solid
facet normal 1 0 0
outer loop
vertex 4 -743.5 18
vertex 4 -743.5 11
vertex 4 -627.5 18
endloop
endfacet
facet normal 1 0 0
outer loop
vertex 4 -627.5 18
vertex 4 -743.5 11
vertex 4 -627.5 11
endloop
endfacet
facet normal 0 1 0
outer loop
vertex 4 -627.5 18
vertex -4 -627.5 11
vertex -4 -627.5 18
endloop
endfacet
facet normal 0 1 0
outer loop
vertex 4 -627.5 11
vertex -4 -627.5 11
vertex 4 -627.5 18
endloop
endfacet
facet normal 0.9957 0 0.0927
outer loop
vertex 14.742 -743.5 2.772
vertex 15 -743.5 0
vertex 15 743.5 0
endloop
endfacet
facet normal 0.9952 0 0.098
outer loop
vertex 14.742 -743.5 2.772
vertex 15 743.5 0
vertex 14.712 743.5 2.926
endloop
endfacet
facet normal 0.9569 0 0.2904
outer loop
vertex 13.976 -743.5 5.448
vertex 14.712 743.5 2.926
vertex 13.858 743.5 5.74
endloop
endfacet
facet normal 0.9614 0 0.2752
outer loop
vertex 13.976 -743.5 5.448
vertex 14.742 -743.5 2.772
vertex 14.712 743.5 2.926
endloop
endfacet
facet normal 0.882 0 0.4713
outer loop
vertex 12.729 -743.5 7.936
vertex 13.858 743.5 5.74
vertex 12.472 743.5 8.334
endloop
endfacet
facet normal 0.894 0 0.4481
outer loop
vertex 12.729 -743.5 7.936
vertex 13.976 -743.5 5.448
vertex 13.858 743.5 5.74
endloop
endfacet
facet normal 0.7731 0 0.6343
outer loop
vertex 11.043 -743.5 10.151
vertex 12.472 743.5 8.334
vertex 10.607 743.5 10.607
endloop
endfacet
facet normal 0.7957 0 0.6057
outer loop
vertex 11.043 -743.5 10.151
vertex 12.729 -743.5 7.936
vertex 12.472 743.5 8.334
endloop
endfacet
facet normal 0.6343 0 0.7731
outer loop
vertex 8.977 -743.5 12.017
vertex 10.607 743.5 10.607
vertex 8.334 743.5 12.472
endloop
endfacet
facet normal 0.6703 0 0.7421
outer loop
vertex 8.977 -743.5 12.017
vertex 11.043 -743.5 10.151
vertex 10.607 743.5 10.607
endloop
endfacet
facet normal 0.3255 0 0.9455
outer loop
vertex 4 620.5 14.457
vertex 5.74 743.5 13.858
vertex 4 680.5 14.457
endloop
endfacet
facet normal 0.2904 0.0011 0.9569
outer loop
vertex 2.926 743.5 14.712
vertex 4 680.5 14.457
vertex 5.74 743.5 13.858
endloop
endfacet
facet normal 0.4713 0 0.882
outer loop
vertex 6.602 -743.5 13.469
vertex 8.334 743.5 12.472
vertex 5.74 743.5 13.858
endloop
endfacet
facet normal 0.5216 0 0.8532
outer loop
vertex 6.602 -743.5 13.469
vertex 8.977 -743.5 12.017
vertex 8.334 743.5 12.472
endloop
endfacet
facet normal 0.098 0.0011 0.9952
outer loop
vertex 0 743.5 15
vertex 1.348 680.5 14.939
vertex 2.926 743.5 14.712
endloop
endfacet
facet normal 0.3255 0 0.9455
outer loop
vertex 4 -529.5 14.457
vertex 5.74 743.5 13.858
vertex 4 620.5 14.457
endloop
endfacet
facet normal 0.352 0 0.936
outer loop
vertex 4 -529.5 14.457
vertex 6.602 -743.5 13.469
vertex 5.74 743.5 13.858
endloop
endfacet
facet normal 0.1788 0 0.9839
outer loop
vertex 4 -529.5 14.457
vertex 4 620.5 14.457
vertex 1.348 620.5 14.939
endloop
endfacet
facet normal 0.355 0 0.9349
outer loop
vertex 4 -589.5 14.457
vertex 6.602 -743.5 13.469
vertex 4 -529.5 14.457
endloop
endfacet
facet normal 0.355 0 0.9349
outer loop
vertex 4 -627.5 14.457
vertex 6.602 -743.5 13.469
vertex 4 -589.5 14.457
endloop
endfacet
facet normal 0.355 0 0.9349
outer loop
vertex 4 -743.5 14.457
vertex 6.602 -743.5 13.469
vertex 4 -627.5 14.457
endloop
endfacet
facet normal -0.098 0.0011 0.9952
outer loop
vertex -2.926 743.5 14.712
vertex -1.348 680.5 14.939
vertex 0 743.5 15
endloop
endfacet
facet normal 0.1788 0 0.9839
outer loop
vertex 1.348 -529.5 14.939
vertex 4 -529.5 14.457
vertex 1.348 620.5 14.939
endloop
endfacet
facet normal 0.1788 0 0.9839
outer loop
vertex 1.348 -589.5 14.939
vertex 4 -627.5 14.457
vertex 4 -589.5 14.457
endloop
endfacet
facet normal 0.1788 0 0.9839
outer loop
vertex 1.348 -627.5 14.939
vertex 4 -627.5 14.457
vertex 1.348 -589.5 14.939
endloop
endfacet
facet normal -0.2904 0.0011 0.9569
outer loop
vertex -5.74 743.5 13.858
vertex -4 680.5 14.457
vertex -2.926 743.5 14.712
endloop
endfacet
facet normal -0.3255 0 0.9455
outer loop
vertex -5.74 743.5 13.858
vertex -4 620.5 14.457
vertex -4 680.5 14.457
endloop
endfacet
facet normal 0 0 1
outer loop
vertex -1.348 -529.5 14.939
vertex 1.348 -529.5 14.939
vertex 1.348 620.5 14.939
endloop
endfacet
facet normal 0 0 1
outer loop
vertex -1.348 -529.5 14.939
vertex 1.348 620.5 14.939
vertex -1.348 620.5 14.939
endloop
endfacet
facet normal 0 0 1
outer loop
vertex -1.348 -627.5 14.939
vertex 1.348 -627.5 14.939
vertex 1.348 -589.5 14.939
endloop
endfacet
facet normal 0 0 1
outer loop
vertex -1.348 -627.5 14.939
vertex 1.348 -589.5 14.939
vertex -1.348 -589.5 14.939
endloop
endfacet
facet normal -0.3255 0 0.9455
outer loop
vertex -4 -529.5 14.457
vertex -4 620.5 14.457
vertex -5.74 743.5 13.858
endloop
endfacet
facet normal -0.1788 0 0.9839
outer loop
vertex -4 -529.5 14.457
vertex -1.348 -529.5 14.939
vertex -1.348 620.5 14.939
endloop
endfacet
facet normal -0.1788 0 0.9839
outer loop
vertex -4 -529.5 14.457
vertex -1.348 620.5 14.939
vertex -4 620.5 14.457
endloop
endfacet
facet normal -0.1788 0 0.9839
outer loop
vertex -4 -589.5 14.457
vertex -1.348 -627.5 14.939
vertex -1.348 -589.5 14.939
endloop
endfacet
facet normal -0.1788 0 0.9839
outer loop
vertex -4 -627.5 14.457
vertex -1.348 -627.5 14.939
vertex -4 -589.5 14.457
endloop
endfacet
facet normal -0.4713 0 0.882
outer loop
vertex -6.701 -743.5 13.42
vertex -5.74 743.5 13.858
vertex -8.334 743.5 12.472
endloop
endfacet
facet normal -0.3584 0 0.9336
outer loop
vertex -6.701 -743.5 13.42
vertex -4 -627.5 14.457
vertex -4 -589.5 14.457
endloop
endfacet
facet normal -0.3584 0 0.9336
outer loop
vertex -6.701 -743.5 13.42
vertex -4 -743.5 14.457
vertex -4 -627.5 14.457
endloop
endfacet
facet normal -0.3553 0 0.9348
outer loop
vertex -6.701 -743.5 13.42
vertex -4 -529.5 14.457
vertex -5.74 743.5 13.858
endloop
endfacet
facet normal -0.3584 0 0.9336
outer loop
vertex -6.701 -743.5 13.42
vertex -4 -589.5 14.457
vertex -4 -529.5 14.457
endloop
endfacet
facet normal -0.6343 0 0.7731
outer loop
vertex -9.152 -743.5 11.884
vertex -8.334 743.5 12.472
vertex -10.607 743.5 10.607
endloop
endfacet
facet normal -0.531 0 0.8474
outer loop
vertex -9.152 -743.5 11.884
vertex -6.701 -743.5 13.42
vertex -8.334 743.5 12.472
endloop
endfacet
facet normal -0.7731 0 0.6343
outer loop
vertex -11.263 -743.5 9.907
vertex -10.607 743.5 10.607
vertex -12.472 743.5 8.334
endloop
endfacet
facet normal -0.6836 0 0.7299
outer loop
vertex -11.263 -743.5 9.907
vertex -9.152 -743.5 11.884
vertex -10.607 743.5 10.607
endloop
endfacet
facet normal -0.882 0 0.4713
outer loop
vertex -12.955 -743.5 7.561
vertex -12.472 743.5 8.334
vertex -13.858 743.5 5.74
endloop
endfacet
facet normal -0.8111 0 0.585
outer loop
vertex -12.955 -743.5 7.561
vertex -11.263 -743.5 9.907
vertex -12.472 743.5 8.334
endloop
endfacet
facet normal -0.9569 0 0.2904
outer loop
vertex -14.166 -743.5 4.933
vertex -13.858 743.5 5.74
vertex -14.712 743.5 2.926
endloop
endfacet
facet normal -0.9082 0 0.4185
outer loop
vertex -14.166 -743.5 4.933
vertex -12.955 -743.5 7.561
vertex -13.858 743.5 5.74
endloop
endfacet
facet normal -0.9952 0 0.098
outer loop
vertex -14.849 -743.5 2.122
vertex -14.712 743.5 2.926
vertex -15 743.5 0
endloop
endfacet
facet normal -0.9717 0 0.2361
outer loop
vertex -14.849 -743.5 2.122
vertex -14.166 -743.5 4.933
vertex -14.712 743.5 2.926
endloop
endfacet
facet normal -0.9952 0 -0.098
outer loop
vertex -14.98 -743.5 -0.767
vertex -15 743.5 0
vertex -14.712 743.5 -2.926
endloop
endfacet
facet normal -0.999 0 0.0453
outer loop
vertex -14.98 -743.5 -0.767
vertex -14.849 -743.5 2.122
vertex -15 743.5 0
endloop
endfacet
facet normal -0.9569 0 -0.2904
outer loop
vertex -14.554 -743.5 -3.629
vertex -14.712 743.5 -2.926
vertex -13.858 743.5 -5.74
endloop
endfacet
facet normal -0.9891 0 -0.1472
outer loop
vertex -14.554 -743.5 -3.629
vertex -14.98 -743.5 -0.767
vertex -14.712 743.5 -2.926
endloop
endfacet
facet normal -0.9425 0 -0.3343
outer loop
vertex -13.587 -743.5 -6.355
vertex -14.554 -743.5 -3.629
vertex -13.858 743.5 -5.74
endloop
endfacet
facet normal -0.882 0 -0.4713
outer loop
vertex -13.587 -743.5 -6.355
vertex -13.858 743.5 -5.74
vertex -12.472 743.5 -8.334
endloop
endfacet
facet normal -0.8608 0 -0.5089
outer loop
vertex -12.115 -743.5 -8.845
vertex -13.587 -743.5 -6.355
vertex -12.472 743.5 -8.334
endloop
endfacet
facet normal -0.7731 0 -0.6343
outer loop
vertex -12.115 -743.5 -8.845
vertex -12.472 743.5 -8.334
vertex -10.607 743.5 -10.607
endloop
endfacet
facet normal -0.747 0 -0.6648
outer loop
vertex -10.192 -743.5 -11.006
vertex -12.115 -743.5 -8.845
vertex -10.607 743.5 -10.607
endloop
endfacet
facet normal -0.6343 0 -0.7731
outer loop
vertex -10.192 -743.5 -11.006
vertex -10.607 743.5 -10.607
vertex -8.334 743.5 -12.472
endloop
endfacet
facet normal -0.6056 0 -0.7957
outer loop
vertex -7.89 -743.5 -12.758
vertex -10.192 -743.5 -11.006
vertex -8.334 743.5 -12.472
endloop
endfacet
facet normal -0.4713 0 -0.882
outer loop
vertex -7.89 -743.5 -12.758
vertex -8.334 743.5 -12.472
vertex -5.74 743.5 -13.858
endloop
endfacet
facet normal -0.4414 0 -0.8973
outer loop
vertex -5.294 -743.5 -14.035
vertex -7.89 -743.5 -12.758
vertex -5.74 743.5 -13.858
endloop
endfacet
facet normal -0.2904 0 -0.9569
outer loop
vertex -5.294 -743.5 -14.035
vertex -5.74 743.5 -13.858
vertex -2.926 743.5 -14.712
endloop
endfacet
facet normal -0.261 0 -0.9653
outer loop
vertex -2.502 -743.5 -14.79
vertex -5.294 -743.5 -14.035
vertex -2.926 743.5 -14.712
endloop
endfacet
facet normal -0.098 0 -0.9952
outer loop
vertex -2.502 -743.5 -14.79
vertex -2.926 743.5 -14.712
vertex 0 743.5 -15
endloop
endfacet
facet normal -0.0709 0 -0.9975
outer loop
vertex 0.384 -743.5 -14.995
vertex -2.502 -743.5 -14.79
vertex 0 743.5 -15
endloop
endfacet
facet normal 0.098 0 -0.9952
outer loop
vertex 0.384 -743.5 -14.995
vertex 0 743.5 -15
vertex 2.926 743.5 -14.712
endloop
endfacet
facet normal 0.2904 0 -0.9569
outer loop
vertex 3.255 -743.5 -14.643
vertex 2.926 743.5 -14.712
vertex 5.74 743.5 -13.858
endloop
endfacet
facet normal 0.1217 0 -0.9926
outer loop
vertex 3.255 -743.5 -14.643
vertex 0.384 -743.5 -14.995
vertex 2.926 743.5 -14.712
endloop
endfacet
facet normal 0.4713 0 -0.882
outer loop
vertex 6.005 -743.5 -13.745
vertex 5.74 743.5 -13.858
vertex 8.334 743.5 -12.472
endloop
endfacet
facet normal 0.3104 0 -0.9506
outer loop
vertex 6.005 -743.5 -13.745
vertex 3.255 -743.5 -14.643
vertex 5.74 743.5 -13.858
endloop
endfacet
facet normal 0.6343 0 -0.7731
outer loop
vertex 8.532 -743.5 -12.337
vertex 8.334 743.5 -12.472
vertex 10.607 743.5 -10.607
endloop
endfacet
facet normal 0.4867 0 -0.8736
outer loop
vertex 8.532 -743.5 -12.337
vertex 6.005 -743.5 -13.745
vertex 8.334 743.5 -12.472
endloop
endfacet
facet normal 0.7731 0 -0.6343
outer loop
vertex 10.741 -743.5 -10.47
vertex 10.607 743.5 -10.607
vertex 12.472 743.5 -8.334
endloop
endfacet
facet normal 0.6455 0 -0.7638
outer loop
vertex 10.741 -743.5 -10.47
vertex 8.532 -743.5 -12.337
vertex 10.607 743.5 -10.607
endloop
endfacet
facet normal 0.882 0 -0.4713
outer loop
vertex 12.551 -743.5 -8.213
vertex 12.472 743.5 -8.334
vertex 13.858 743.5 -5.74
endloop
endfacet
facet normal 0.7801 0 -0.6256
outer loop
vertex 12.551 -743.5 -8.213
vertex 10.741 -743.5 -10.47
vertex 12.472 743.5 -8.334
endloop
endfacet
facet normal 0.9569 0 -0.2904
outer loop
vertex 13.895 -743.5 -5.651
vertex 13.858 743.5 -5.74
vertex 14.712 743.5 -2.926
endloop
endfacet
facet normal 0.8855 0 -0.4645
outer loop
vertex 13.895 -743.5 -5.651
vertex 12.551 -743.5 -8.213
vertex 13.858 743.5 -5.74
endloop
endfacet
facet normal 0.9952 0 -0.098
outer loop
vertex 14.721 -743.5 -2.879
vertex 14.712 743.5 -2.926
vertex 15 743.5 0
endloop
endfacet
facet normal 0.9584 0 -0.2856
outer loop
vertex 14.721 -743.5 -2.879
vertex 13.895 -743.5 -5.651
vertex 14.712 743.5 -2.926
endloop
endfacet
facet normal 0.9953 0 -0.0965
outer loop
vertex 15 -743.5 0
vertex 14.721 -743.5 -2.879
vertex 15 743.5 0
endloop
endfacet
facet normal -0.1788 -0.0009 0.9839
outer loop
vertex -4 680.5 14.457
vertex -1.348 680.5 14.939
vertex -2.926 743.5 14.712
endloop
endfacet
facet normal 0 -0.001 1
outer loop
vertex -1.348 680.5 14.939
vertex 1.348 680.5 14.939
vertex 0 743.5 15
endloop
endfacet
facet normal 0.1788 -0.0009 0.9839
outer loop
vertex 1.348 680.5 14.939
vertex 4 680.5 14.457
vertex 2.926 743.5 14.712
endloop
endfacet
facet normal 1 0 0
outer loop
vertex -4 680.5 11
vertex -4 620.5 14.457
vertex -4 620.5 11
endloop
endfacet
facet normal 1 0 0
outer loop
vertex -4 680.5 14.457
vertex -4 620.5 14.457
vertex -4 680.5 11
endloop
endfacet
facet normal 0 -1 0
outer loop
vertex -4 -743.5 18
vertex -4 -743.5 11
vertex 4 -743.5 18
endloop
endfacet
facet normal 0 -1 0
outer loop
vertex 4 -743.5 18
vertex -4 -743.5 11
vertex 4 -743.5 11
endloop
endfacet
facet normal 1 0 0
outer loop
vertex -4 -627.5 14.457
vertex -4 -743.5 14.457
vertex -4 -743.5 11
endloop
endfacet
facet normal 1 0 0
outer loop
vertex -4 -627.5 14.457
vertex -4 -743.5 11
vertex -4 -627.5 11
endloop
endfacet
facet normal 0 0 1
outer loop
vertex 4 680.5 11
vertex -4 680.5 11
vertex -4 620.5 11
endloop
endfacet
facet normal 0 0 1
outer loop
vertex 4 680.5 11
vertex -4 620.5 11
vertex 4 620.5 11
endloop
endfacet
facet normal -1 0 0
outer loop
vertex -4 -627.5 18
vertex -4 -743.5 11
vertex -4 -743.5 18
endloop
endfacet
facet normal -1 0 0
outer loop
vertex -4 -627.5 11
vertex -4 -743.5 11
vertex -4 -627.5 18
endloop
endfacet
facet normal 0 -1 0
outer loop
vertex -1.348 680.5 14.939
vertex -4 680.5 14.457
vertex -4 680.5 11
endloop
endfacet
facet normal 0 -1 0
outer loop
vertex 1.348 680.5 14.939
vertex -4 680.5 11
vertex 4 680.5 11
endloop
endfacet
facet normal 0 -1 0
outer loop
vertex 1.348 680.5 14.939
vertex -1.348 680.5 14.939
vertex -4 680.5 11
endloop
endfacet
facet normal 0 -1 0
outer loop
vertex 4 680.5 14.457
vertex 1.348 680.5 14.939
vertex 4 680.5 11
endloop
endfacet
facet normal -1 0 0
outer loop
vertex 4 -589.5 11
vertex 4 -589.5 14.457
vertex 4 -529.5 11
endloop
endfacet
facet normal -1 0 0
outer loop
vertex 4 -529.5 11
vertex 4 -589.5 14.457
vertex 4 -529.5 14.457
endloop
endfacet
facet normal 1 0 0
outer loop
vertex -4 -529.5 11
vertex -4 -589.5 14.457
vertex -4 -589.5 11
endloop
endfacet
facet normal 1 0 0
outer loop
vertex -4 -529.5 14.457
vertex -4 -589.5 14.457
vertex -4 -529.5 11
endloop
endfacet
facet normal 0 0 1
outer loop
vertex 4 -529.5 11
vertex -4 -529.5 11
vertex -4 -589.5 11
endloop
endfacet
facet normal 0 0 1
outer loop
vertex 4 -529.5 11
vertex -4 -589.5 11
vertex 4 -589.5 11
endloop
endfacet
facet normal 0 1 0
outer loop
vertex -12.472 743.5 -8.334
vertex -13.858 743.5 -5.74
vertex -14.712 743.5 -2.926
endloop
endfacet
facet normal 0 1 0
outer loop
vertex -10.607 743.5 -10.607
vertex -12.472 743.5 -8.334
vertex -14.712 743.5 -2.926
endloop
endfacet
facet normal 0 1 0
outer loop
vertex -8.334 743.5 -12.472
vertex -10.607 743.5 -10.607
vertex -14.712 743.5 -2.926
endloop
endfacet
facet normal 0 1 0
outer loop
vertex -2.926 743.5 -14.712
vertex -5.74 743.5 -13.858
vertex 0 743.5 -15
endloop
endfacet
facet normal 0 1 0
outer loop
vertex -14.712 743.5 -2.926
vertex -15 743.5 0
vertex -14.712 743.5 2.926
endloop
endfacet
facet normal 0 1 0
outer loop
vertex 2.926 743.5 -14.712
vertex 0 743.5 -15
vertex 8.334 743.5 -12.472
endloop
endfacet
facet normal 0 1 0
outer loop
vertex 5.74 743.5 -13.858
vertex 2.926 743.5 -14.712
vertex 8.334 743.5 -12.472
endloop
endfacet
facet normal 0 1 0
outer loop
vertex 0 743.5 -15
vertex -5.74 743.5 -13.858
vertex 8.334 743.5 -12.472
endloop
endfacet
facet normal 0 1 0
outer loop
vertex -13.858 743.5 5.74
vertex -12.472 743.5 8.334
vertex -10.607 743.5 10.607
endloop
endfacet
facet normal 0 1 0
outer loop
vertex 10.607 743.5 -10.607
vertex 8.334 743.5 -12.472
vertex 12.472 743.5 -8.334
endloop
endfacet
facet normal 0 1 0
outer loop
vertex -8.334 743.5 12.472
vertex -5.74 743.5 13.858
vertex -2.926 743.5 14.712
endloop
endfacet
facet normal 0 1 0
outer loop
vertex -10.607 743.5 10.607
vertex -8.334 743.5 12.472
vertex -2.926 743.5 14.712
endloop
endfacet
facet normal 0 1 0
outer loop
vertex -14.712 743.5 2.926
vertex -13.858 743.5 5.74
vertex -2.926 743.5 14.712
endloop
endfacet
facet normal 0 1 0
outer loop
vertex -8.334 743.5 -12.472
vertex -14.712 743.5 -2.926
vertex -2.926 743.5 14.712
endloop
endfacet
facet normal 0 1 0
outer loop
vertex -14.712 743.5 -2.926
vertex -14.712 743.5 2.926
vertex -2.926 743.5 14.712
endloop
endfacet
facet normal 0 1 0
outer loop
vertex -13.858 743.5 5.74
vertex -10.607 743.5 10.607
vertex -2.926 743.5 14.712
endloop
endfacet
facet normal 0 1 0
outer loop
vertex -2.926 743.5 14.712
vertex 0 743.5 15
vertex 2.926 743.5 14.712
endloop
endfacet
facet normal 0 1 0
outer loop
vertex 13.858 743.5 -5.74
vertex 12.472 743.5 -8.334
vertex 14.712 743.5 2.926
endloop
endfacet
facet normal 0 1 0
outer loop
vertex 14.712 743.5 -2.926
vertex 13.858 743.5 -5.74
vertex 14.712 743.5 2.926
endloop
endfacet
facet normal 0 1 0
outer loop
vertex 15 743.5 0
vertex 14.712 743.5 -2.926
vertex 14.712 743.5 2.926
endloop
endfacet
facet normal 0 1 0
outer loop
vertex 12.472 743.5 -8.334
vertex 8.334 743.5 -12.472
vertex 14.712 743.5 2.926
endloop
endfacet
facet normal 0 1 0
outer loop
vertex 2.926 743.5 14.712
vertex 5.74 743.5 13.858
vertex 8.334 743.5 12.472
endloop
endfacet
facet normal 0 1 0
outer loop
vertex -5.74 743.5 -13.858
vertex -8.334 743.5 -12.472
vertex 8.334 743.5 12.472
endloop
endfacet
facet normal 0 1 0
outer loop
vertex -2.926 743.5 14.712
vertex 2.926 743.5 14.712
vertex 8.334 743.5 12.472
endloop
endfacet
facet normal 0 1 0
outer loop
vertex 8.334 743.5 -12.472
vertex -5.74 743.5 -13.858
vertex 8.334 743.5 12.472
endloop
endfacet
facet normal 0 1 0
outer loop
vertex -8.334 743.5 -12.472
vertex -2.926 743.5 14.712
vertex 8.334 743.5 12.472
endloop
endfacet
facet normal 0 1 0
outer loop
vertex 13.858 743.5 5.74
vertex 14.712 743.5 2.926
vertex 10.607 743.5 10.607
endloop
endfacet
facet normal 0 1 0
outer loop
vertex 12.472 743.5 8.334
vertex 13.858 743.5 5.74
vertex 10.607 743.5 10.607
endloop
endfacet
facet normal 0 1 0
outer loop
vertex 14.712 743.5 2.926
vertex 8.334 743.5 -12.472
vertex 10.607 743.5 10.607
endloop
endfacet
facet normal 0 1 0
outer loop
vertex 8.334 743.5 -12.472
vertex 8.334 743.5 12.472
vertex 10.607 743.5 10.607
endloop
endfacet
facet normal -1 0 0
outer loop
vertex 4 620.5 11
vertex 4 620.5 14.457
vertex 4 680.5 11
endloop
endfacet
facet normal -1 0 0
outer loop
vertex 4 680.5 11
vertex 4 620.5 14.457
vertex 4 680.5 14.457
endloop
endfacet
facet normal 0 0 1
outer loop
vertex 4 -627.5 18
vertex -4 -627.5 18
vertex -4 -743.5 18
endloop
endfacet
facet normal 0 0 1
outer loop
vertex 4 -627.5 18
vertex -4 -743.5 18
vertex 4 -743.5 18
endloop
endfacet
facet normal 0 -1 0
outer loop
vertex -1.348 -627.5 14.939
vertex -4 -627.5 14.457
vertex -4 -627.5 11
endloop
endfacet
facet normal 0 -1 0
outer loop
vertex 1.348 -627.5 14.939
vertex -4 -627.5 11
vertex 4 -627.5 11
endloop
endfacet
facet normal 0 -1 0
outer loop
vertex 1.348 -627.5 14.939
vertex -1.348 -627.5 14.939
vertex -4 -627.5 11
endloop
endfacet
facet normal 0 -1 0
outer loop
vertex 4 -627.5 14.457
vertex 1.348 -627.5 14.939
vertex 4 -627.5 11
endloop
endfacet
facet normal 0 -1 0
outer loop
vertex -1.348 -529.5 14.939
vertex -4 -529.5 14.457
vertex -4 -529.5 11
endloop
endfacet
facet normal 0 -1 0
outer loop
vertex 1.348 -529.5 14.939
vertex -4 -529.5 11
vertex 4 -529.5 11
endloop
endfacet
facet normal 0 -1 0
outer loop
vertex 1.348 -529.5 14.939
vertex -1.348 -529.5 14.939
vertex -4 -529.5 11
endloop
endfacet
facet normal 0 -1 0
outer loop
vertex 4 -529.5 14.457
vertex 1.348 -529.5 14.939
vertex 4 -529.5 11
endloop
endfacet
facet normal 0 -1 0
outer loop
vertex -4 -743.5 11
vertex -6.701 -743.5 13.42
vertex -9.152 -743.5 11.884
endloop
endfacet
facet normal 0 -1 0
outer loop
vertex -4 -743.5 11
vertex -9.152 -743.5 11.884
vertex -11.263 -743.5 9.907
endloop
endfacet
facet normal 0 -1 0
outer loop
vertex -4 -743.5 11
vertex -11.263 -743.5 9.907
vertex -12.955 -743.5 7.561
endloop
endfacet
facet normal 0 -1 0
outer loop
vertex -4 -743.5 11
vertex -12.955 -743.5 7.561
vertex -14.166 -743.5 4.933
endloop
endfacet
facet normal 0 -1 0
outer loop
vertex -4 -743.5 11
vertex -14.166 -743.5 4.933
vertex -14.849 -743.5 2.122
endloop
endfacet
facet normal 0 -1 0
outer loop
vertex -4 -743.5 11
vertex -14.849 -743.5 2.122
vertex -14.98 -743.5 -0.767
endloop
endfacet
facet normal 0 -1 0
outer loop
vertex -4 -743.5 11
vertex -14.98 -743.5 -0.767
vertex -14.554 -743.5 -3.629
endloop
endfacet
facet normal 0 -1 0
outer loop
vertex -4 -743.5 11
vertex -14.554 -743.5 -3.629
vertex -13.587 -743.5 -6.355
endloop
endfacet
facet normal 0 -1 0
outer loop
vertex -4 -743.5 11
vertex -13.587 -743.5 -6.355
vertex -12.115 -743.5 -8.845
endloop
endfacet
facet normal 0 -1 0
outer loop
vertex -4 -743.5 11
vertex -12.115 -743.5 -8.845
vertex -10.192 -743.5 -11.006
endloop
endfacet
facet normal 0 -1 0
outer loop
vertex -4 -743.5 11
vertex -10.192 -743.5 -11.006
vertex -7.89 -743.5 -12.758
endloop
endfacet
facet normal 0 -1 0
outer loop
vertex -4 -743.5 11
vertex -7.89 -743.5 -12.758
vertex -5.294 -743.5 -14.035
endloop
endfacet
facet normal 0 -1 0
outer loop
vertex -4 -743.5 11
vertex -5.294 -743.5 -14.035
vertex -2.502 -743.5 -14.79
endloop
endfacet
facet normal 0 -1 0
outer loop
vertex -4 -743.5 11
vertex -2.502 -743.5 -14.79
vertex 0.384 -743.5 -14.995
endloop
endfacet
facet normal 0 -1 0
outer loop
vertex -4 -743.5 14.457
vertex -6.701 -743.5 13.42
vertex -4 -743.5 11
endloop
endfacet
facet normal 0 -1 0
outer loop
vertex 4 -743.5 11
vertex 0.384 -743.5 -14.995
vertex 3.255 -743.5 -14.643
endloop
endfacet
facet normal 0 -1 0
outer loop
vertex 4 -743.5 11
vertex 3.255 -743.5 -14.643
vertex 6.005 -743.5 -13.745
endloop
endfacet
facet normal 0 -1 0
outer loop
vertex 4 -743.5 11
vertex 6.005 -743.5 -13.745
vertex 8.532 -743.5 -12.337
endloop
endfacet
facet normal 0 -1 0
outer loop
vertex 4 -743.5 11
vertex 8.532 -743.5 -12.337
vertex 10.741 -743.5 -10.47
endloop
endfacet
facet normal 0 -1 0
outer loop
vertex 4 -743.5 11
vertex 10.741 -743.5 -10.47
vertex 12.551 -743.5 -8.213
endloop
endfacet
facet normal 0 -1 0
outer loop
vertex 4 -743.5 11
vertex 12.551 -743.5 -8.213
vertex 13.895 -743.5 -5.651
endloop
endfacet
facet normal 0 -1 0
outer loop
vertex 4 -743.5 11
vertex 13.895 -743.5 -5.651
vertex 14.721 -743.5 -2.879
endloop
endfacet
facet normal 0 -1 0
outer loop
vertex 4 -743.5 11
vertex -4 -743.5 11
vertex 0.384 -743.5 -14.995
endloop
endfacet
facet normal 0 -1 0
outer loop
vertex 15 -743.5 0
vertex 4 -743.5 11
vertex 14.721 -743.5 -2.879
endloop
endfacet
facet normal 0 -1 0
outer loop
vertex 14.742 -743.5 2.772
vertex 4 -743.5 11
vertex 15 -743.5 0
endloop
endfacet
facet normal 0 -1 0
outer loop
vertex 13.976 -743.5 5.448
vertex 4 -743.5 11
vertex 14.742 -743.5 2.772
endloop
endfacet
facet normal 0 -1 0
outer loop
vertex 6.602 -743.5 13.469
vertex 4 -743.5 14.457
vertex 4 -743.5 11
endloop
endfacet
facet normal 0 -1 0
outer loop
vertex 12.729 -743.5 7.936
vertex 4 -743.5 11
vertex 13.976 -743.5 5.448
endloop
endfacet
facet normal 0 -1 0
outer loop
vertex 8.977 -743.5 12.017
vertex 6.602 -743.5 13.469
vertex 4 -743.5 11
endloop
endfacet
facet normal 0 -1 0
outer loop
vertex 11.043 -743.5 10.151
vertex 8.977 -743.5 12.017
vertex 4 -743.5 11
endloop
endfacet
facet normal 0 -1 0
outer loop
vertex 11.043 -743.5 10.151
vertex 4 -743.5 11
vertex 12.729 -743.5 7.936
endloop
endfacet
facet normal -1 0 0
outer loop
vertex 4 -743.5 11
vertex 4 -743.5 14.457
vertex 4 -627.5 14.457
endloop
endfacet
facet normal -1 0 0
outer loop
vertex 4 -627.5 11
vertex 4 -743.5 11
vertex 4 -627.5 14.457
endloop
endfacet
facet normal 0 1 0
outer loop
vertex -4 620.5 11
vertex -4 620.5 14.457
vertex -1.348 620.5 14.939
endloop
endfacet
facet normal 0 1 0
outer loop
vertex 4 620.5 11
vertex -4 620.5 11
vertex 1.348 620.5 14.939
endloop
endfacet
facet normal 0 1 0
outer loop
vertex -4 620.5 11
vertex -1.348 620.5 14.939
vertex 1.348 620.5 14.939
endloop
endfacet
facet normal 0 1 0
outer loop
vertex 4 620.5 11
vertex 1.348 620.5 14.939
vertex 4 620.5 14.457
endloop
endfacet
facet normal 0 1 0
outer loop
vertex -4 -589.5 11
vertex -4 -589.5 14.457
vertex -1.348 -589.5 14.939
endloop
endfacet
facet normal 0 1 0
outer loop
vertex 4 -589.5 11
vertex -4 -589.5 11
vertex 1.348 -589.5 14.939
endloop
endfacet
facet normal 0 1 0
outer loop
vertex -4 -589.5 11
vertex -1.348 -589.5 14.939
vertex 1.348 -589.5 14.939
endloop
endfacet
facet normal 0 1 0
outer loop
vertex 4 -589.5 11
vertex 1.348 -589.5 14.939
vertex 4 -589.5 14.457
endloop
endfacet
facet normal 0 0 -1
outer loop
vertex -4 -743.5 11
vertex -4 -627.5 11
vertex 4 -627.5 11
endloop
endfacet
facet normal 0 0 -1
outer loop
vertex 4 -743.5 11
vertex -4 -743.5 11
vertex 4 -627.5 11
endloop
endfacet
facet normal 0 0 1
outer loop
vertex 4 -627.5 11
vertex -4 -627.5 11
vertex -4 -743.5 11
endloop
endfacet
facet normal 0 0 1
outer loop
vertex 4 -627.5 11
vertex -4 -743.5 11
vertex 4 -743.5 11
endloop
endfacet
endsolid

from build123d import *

# Parameters (mm, degrees)
F0_R     = 15
F1_DEPTH = 743.5
F3_W     = 8
F3_H     = 60
F3_H_2   = 116
F4_DEPTH = 4
F5_DEPTH = 7


with BuildPart() as f1:
    # F0 (on Front) → F1 (new body, symmetric)
    with BuildSketch(Plane.XZ):
        Circle(F0_R)
    extrude(amount=F1_DEPTH, both=True)

    # F3 (on offset) → F4 (cut)
    with BuildSketch(Plane.XY.offset(15)):
        with Locations((0, 650.5)):
            Rectangle(F3_W, F3_H)
        with Locations((0, -559.5)):
            Rectangle(F3_W, F3_H)
        with Locations((0, -685.5)):
            Rectangle(F3_W, F3_H_2)
    extrude(amount=-F4_DEPTH, mode=Mode.SUBTRACT)


with BuildPart() as f5:
    # F5 (new): a face of the model
    f5_faces = [f1.part.faces().sort_by_distance(p)[0] for p in [
        (0, -685.5, 11),
    ]]
    extrude(f5_faces, amount=F5_DEPTH)


solid = Compound([f1.part, f5.part])
